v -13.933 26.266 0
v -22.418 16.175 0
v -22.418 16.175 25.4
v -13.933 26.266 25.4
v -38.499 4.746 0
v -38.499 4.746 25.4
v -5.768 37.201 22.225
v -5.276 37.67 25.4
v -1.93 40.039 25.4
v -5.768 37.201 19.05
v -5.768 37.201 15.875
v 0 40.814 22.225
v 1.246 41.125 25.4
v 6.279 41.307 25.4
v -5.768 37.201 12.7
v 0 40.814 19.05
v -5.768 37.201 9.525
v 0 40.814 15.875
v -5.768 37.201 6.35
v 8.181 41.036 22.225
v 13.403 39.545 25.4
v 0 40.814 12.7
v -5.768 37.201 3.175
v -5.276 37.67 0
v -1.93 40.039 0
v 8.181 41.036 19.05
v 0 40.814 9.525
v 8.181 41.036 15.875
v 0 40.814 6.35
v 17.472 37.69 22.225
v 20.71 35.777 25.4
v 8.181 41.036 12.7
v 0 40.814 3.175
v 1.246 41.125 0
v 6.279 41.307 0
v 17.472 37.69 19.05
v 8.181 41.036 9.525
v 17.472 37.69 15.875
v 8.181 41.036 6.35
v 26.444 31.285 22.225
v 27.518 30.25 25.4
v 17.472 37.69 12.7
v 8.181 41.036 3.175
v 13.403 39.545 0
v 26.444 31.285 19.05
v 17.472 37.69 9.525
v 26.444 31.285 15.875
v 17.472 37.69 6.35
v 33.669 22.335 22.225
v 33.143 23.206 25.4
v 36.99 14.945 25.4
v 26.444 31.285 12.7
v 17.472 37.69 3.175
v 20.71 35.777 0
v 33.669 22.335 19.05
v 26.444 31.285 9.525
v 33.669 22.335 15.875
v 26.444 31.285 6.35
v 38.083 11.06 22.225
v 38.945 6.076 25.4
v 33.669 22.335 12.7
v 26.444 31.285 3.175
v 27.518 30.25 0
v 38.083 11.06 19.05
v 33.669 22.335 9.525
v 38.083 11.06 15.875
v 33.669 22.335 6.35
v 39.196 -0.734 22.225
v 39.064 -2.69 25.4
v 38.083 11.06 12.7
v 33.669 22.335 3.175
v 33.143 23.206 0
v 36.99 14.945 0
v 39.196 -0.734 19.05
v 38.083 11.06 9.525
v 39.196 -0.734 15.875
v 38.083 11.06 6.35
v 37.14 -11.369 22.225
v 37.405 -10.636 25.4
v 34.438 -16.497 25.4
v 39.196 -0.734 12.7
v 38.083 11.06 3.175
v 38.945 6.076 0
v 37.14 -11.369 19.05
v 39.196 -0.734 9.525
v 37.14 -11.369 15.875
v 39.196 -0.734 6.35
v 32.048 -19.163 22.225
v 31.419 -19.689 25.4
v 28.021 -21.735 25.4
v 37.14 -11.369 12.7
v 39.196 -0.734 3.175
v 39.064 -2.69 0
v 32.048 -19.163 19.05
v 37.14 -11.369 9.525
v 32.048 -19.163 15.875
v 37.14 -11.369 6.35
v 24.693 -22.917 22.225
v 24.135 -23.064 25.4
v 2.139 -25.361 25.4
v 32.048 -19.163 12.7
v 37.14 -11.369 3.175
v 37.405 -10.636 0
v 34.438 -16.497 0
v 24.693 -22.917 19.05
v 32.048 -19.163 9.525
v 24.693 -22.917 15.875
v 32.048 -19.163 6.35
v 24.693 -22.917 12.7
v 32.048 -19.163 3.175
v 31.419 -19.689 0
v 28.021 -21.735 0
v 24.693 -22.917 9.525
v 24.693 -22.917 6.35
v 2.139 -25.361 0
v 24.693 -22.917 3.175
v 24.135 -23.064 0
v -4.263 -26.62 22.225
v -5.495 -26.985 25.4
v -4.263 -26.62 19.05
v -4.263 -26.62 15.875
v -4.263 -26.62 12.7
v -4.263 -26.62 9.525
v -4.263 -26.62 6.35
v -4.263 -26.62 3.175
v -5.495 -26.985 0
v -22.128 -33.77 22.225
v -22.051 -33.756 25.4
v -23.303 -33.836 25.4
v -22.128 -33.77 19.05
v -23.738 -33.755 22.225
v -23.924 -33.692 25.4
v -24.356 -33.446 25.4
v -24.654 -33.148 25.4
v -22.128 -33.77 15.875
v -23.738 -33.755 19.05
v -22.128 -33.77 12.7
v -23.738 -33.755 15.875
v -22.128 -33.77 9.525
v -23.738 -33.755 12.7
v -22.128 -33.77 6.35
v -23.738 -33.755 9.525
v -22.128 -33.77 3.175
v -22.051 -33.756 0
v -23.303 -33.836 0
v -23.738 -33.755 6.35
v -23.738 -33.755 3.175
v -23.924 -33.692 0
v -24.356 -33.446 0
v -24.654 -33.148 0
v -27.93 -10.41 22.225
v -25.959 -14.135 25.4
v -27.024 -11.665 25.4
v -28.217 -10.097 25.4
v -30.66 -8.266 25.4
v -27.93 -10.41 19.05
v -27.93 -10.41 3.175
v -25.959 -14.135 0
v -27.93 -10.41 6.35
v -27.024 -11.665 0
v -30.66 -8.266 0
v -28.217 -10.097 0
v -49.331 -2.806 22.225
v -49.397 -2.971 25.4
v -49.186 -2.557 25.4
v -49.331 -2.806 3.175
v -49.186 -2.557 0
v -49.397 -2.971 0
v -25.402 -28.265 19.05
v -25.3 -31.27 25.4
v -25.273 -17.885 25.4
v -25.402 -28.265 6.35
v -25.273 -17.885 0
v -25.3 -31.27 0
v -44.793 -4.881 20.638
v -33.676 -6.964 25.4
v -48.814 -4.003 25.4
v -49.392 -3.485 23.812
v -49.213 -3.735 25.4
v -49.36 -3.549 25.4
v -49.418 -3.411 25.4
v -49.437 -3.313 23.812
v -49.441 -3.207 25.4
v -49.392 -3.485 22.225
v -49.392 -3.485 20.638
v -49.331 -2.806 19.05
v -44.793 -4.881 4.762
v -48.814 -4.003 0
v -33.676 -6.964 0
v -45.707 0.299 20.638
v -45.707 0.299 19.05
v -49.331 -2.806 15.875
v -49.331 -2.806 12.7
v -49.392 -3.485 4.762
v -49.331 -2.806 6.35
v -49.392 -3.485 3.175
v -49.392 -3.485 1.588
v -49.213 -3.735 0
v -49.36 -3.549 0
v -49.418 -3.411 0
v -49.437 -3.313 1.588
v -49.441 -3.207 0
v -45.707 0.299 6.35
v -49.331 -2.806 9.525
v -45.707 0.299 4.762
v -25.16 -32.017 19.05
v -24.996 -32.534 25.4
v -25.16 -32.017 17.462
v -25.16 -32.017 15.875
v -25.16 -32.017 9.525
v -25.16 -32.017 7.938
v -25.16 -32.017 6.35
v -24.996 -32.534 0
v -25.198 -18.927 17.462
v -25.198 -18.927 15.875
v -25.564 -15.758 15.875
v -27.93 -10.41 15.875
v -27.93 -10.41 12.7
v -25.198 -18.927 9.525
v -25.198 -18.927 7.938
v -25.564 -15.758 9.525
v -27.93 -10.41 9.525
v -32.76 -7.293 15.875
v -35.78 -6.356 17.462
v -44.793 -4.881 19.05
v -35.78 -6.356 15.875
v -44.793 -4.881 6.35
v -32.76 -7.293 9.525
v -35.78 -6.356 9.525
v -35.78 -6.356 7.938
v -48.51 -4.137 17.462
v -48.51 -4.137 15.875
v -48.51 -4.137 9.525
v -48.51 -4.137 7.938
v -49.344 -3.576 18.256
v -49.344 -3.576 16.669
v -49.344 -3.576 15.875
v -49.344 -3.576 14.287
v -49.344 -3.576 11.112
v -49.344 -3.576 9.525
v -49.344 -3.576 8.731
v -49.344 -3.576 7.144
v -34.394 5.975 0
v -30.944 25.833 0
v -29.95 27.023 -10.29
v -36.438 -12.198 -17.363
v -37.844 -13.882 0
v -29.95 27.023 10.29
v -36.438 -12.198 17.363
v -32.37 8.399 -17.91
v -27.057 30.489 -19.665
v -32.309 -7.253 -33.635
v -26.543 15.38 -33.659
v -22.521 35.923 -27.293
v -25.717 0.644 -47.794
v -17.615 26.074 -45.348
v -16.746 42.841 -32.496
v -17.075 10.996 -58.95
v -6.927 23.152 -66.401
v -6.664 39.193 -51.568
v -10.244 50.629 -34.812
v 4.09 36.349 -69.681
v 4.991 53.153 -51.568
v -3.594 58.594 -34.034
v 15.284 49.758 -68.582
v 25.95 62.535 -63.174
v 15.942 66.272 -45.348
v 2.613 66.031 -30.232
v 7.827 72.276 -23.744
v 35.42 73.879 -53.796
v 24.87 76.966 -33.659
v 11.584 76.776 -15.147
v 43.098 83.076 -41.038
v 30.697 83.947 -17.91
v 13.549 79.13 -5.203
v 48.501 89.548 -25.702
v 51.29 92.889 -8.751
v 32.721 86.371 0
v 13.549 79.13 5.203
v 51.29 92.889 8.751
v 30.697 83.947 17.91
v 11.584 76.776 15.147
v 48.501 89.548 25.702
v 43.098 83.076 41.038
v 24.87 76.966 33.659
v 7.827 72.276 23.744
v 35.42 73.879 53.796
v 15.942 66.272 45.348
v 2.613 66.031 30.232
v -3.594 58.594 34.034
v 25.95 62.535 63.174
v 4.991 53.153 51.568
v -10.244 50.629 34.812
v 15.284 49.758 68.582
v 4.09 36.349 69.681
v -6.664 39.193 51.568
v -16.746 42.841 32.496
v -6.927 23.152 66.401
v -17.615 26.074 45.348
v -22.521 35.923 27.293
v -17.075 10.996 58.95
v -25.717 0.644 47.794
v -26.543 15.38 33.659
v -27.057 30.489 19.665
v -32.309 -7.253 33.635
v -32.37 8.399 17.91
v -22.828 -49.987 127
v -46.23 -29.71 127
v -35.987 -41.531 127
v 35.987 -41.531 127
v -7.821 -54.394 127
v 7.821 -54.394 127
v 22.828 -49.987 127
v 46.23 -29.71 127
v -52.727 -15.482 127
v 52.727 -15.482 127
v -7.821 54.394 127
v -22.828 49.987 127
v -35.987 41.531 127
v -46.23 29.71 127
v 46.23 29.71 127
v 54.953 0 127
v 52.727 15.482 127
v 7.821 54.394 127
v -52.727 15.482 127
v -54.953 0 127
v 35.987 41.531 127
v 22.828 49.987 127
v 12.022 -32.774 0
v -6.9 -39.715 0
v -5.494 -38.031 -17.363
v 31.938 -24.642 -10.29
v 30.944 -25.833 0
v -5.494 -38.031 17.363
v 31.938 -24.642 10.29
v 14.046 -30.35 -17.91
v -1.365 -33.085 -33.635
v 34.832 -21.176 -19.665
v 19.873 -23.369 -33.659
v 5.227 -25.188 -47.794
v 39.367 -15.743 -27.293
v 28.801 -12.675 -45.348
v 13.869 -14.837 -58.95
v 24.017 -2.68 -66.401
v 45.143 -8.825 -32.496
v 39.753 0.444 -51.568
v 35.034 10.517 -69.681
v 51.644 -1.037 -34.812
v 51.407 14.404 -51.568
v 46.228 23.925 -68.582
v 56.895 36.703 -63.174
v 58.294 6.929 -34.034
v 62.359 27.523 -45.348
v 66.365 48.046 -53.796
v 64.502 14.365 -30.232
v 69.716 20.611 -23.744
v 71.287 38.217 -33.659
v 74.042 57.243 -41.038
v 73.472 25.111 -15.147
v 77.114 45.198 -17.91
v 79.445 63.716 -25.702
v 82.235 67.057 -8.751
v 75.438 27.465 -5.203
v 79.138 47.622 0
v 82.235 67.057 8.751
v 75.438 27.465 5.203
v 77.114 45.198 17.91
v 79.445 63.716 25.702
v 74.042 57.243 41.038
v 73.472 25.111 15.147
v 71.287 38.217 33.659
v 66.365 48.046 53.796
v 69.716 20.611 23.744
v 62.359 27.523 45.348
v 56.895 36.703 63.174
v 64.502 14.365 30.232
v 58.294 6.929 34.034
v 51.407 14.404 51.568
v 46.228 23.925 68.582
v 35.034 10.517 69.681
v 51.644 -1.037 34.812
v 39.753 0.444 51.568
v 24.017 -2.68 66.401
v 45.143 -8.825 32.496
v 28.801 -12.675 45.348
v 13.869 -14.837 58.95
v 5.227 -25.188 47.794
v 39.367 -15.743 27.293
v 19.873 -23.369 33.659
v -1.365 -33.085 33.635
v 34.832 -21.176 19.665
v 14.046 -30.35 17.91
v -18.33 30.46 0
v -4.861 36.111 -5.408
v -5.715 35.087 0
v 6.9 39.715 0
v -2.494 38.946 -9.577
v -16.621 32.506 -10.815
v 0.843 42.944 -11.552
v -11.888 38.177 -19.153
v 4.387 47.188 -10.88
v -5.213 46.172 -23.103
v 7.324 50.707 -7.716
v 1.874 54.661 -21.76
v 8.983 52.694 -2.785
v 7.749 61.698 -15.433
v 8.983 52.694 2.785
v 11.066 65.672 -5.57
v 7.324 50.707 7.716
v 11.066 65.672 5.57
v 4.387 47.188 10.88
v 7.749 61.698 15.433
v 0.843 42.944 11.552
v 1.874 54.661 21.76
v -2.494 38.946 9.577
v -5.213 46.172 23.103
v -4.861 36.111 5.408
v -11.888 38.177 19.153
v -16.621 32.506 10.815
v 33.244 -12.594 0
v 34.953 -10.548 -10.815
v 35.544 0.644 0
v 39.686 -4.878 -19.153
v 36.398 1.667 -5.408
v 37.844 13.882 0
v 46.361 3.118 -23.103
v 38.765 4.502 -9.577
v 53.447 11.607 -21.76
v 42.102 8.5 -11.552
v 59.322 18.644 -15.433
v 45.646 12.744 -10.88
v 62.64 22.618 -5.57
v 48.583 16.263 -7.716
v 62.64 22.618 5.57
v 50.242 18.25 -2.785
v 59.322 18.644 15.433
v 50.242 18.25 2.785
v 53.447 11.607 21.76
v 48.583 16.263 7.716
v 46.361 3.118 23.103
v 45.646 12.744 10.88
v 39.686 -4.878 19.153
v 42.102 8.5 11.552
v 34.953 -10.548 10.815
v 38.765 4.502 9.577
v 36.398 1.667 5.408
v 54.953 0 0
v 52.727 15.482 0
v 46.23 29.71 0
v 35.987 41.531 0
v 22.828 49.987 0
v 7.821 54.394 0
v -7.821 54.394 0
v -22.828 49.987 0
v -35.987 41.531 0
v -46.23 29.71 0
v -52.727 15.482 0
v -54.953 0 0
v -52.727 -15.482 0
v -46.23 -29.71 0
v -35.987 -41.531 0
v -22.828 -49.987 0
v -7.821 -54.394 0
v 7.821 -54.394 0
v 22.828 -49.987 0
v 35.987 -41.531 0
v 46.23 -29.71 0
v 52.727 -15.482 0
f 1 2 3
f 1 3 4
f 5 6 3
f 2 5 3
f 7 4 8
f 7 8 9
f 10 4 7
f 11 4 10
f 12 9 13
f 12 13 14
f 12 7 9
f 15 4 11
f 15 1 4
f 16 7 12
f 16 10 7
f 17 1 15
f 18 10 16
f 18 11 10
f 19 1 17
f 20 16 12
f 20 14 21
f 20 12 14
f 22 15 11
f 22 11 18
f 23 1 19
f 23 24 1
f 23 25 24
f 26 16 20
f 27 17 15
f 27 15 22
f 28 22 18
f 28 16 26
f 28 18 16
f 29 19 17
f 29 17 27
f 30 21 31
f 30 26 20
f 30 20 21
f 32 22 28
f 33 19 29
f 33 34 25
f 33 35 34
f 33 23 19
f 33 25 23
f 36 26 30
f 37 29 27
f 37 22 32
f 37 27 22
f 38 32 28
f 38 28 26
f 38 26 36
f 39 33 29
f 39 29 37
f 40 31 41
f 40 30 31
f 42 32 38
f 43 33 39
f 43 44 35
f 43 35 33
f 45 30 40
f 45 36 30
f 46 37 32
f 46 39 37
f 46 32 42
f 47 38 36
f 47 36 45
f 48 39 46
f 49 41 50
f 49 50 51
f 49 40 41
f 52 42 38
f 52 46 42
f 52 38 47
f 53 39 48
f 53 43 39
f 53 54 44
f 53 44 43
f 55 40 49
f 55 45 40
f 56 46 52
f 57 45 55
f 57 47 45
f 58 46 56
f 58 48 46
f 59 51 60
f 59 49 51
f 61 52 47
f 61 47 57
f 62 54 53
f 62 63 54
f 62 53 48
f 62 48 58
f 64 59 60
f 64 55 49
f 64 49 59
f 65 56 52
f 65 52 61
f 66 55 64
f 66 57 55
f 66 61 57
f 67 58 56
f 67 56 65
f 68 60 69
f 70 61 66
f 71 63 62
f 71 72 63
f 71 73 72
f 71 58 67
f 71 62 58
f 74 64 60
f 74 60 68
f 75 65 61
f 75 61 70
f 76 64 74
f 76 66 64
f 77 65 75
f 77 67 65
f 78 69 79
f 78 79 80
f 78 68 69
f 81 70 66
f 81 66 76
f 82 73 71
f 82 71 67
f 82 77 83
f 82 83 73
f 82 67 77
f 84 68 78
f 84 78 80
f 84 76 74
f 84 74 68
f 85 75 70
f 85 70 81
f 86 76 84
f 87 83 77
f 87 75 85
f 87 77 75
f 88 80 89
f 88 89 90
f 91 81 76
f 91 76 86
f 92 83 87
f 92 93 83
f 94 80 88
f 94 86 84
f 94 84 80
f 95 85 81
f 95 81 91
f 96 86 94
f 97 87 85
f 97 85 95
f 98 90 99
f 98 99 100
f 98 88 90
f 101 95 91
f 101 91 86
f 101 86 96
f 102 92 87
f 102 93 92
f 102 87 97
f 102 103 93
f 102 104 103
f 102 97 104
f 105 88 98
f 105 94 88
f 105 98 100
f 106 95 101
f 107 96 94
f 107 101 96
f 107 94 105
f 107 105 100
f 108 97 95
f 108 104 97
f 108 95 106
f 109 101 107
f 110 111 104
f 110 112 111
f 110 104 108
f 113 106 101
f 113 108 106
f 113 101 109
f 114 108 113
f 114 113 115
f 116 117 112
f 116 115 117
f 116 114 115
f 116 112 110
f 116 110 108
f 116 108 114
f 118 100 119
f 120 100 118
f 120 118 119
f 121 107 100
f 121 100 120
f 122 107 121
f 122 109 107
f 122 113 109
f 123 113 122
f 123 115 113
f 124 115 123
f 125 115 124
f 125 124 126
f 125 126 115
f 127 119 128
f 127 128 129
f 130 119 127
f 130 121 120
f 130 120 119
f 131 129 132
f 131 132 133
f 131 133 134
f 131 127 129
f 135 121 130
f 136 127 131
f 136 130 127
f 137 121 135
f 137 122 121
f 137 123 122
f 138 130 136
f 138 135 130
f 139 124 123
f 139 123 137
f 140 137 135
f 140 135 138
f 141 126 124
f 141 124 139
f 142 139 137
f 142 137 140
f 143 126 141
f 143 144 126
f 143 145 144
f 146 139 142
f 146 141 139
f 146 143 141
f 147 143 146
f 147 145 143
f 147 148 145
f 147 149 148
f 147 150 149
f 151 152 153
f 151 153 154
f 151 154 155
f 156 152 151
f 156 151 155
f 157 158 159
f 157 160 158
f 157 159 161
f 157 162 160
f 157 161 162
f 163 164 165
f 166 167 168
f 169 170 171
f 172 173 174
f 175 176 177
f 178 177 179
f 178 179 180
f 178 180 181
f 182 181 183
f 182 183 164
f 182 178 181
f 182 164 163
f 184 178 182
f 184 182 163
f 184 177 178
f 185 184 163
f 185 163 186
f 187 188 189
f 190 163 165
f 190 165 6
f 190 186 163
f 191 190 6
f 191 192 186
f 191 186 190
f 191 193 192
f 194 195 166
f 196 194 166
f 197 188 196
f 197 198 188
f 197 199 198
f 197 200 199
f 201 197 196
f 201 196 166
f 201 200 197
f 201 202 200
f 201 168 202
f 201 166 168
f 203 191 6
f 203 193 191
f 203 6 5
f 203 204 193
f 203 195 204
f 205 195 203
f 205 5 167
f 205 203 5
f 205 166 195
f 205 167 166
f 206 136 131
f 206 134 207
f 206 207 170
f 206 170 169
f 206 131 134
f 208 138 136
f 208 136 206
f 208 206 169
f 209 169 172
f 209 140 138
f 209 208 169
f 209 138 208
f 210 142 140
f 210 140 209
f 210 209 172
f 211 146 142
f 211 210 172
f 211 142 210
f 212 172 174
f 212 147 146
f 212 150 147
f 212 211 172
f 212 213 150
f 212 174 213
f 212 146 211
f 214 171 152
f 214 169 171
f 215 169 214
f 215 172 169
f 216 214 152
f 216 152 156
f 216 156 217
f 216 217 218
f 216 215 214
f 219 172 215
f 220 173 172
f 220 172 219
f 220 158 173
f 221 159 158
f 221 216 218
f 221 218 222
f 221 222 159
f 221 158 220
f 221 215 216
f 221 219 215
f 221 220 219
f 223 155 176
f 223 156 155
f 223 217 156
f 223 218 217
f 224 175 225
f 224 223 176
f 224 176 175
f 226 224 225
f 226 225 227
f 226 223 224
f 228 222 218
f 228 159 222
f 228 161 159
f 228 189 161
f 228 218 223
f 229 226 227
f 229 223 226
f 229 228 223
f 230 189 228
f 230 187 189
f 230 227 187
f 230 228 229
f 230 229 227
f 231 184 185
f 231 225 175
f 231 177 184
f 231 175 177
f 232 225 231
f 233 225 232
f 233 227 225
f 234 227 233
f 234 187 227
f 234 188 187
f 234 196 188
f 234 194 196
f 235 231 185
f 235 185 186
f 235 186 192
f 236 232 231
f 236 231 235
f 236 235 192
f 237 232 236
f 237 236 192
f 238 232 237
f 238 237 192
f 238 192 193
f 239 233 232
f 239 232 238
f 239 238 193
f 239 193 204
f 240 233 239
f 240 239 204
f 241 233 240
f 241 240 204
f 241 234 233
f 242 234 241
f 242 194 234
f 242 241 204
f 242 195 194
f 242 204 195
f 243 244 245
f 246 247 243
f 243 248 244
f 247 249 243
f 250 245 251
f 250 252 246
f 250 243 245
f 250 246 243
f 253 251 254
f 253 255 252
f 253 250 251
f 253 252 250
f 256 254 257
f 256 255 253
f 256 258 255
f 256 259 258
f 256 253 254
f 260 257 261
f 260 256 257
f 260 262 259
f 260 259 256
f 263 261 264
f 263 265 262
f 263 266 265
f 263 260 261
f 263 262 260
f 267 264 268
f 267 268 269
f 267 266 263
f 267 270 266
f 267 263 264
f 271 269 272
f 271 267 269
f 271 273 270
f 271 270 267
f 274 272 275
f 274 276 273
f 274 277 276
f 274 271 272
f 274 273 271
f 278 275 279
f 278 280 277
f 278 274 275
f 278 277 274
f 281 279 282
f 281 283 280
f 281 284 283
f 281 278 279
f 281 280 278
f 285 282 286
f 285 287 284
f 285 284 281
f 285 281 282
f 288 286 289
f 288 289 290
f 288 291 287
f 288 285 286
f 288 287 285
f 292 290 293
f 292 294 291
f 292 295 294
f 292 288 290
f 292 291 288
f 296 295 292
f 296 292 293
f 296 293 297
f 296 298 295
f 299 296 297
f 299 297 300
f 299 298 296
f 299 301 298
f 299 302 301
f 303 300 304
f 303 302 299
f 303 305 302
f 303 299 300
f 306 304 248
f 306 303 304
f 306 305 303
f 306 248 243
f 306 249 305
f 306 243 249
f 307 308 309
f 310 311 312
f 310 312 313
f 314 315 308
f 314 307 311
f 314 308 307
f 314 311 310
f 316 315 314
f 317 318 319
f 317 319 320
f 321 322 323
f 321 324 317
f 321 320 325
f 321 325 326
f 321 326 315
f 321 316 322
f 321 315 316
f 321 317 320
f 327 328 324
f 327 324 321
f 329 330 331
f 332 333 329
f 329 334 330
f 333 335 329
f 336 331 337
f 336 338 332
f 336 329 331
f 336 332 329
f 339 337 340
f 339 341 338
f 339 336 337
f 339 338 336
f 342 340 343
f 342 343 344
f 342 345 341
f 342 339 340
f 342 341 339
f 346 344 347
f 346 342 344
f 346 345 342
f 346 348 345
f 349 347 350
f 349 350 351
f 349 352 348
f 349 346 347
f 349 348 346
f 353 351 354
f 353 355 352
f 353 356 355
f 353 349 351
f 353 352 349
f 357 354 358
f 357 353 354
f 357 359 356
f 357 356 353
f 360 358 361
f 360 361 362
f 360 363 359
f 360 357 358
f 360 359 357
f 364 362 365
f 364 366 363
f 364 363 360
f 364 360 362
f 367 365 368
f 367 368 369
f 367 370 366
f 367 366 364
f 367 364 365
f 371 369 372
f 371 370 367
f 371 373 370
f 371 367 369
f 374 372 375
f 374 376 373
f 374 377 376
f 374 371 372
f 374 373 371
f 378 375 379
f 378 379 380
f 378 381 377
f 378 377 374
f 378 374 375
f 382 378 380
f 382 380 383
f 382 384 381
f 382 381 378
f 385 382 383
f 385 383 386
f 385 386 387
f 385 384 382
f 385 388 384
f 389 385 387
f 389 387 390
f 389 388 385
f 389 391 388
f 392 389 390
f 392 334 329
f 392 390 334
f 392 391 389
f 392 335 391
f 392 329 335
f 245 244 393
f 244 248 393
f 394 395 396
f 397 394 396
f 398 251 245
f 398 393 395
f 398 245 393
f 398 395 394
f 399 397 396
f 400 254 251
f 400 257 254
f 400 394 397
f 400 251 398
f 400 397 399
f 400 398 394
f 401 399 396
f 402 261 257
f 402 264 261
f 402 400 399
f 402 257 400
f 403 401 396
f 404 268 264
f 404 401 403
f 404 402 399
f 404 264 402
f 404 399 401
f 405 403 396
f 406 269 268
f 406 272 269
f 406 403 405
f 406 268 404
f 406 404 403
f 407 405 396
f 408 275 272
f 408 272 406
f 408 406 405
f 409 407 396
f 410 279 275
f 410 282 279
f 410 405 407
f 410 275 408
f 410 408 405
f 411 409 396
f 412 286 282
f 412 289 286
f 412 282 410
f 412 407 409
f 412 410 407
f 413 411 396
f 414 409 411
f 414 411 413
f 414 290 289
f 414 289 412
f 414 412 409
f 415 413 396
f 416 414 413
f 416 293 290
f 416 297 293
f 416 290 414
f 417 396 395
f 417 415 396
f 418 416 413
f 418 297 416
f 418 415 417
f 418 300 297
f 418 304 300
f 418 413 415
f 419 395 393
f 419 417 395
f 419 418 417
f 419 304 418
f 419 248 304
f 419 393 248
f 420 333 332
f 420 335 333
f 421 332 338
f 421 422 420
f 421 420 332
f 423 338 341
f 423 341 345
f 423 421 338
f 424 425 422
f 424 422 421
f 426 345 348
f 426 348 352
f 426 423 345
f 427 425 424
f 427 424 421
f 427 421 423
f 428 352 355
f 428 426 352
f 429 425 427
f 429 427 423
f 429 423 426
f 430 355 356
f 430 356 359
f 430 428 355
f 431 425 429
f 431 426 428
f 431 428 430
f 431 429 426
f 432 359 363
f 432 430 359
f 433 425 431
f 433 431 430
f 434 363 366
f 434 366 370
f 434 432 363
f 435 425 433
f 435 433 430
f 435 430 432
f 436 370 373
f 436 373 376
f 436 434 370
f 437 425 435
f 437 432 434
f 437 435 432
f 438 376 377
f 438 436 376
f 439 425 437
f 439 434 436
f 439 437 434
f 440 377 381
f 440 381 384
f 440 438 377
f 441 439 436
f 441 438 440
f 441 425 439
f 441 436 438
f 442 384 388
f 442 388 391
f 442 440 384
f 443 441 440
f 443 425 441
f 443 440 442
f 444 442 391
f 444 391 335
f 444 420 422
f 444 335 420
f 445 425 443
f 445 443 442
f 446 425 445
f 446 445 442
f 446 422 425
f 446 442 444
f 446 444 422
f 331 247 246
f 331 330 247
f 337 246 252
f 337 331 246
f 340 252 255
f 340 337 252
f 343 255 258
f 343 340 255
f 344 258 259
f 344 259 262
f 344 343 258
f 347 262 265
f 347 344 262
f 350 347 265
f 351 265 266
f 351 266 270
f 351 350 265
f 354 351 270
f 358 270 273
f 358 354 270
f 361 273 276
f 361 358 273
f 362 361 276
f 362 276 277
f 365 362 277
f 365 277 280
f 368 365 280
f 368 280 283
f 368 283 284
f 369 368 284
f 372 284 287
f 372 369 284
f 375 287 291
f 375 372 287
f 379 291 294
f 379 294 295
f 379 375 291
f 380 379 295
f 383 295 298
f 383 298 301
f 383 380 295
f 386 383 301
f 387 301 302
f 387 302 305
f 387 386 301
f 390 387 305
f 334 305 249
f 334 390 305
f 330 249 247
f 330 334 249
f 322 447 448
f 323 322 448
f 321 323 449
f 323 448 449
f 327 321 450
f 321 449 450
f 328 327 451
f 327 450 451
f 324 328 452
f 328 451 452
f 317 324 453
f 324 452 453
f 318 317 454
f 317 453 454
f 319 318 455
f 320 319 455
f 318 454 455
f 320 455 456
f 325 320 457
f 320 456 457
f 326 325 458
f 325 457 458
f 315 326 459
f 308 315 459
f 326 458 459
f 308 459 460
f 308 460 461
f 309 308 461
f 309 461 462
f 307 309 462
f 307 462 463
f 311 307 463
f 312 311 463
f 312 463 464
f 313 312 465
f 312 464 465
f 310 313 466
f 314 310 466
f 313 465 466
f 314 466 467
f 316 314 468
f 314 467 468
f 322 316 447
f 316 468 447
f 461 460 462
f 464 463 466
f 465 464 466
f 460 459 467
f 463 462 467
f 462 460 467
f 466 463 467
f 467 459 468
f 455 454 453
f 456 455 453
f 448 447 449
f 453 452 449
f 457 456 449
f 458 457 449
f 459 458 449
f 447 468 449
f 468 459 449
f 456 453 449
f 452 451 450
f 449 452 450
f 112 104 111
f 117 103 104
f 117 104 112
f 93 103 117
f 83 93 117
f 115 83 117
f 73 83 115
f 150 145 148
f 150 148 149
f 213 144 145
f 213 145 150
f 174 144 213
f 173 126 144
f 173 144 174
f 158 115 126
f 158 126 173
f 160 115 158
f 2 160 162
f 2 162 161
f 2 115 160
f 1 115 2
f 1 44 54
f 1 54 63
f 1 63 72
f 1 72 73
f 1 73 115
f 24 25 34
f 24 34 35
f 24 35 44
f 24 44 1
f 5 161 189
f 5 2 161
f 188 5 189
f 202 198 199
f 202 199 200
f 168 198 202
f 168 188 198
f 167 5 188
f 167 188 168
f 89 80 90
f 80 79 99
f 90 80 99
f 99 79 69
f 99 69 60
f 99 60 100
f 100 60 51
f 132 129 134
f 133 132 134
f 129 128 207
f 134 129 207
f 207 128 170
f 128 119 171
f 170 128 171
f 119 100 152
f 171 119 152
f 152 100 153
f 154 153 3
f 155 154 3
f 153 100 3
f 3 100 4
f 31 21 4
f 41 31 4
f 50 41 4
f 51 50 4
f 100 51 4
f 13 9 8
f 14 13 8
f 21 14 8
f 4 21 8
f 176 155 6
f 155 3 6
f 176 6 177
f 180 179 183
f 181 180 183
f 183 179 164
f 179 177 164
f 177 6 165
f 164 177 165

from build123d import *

# Parameters (mm, degrees)
F0_R     = 54.9531653684
F1_DEPTH = 127
F7_DEPTH = 25.4


# Not quite as in the source:
# - a feature of the source that left no trace in its solid (it failed there, or was rolled back) is left out
# - the program builds the solid bodies; features that only make, move or delete a surface that nothing else refers to are left out


with BuildPart() as f1:
    # F0 (on Top) → F1 (new body)
    with BuildSketch(Plane.XY):
        Circle(F0_R)
    extrude(amount=F1_DEPTH)


with BuildPart() as f3:
    # F2 (on Top) → F3 (revolve)
    with BuildSketch(Plane.XY):
        Polygon((30.9442904428, -25.8326890354), (37.8439101741, 13.8821971078), (6.8996197313, 39.7148861432), (-30.9442904428, 25.8326890354), (-37.8439101741, -13.8821971078), (-6.8996197313, -39.7148861432), align=None)
    revolve(axis=Axis((22.3717649527, 26.7985416255, 0), (0.7676624397, -0.640854413, 0)))


with BuildPart() as f7:
    # F6 (on Top) → F7 (new body)
    with BuildSketch(Plane.XY):
        with BuildLine():
            add(Edge.make_bspline(
                [(-22.4183332175, 16.1747615784), (-11.8871169461, 25.9707679053), (-5.6486125726, 51.1465707181), (42.7874188306, 27.4433614183), (39.8462276715, -30.123574606), (-2.9479560075, -20.4408335204), (-31.1948387365, -43.0855866328), (-18.3031677908, -3.1092882088), (-65.8787672835, -7.2071620203), (-32.9625958172, 6.3666197193), (-22.4183332175, 16.1747615784)],
                knots=[0, 0, 0, 0, 0.1298859642, 0.2693514147, 0.414375979, 0.5513899534, 0.6555656862, 0.7633147629, 0.8699531299, 1, 1, 1, 1], degree=3))
        make_face()
    extrude(amount=F7_DEPTH)


solid = Compound([f1.part, f3.part, f7.part])
